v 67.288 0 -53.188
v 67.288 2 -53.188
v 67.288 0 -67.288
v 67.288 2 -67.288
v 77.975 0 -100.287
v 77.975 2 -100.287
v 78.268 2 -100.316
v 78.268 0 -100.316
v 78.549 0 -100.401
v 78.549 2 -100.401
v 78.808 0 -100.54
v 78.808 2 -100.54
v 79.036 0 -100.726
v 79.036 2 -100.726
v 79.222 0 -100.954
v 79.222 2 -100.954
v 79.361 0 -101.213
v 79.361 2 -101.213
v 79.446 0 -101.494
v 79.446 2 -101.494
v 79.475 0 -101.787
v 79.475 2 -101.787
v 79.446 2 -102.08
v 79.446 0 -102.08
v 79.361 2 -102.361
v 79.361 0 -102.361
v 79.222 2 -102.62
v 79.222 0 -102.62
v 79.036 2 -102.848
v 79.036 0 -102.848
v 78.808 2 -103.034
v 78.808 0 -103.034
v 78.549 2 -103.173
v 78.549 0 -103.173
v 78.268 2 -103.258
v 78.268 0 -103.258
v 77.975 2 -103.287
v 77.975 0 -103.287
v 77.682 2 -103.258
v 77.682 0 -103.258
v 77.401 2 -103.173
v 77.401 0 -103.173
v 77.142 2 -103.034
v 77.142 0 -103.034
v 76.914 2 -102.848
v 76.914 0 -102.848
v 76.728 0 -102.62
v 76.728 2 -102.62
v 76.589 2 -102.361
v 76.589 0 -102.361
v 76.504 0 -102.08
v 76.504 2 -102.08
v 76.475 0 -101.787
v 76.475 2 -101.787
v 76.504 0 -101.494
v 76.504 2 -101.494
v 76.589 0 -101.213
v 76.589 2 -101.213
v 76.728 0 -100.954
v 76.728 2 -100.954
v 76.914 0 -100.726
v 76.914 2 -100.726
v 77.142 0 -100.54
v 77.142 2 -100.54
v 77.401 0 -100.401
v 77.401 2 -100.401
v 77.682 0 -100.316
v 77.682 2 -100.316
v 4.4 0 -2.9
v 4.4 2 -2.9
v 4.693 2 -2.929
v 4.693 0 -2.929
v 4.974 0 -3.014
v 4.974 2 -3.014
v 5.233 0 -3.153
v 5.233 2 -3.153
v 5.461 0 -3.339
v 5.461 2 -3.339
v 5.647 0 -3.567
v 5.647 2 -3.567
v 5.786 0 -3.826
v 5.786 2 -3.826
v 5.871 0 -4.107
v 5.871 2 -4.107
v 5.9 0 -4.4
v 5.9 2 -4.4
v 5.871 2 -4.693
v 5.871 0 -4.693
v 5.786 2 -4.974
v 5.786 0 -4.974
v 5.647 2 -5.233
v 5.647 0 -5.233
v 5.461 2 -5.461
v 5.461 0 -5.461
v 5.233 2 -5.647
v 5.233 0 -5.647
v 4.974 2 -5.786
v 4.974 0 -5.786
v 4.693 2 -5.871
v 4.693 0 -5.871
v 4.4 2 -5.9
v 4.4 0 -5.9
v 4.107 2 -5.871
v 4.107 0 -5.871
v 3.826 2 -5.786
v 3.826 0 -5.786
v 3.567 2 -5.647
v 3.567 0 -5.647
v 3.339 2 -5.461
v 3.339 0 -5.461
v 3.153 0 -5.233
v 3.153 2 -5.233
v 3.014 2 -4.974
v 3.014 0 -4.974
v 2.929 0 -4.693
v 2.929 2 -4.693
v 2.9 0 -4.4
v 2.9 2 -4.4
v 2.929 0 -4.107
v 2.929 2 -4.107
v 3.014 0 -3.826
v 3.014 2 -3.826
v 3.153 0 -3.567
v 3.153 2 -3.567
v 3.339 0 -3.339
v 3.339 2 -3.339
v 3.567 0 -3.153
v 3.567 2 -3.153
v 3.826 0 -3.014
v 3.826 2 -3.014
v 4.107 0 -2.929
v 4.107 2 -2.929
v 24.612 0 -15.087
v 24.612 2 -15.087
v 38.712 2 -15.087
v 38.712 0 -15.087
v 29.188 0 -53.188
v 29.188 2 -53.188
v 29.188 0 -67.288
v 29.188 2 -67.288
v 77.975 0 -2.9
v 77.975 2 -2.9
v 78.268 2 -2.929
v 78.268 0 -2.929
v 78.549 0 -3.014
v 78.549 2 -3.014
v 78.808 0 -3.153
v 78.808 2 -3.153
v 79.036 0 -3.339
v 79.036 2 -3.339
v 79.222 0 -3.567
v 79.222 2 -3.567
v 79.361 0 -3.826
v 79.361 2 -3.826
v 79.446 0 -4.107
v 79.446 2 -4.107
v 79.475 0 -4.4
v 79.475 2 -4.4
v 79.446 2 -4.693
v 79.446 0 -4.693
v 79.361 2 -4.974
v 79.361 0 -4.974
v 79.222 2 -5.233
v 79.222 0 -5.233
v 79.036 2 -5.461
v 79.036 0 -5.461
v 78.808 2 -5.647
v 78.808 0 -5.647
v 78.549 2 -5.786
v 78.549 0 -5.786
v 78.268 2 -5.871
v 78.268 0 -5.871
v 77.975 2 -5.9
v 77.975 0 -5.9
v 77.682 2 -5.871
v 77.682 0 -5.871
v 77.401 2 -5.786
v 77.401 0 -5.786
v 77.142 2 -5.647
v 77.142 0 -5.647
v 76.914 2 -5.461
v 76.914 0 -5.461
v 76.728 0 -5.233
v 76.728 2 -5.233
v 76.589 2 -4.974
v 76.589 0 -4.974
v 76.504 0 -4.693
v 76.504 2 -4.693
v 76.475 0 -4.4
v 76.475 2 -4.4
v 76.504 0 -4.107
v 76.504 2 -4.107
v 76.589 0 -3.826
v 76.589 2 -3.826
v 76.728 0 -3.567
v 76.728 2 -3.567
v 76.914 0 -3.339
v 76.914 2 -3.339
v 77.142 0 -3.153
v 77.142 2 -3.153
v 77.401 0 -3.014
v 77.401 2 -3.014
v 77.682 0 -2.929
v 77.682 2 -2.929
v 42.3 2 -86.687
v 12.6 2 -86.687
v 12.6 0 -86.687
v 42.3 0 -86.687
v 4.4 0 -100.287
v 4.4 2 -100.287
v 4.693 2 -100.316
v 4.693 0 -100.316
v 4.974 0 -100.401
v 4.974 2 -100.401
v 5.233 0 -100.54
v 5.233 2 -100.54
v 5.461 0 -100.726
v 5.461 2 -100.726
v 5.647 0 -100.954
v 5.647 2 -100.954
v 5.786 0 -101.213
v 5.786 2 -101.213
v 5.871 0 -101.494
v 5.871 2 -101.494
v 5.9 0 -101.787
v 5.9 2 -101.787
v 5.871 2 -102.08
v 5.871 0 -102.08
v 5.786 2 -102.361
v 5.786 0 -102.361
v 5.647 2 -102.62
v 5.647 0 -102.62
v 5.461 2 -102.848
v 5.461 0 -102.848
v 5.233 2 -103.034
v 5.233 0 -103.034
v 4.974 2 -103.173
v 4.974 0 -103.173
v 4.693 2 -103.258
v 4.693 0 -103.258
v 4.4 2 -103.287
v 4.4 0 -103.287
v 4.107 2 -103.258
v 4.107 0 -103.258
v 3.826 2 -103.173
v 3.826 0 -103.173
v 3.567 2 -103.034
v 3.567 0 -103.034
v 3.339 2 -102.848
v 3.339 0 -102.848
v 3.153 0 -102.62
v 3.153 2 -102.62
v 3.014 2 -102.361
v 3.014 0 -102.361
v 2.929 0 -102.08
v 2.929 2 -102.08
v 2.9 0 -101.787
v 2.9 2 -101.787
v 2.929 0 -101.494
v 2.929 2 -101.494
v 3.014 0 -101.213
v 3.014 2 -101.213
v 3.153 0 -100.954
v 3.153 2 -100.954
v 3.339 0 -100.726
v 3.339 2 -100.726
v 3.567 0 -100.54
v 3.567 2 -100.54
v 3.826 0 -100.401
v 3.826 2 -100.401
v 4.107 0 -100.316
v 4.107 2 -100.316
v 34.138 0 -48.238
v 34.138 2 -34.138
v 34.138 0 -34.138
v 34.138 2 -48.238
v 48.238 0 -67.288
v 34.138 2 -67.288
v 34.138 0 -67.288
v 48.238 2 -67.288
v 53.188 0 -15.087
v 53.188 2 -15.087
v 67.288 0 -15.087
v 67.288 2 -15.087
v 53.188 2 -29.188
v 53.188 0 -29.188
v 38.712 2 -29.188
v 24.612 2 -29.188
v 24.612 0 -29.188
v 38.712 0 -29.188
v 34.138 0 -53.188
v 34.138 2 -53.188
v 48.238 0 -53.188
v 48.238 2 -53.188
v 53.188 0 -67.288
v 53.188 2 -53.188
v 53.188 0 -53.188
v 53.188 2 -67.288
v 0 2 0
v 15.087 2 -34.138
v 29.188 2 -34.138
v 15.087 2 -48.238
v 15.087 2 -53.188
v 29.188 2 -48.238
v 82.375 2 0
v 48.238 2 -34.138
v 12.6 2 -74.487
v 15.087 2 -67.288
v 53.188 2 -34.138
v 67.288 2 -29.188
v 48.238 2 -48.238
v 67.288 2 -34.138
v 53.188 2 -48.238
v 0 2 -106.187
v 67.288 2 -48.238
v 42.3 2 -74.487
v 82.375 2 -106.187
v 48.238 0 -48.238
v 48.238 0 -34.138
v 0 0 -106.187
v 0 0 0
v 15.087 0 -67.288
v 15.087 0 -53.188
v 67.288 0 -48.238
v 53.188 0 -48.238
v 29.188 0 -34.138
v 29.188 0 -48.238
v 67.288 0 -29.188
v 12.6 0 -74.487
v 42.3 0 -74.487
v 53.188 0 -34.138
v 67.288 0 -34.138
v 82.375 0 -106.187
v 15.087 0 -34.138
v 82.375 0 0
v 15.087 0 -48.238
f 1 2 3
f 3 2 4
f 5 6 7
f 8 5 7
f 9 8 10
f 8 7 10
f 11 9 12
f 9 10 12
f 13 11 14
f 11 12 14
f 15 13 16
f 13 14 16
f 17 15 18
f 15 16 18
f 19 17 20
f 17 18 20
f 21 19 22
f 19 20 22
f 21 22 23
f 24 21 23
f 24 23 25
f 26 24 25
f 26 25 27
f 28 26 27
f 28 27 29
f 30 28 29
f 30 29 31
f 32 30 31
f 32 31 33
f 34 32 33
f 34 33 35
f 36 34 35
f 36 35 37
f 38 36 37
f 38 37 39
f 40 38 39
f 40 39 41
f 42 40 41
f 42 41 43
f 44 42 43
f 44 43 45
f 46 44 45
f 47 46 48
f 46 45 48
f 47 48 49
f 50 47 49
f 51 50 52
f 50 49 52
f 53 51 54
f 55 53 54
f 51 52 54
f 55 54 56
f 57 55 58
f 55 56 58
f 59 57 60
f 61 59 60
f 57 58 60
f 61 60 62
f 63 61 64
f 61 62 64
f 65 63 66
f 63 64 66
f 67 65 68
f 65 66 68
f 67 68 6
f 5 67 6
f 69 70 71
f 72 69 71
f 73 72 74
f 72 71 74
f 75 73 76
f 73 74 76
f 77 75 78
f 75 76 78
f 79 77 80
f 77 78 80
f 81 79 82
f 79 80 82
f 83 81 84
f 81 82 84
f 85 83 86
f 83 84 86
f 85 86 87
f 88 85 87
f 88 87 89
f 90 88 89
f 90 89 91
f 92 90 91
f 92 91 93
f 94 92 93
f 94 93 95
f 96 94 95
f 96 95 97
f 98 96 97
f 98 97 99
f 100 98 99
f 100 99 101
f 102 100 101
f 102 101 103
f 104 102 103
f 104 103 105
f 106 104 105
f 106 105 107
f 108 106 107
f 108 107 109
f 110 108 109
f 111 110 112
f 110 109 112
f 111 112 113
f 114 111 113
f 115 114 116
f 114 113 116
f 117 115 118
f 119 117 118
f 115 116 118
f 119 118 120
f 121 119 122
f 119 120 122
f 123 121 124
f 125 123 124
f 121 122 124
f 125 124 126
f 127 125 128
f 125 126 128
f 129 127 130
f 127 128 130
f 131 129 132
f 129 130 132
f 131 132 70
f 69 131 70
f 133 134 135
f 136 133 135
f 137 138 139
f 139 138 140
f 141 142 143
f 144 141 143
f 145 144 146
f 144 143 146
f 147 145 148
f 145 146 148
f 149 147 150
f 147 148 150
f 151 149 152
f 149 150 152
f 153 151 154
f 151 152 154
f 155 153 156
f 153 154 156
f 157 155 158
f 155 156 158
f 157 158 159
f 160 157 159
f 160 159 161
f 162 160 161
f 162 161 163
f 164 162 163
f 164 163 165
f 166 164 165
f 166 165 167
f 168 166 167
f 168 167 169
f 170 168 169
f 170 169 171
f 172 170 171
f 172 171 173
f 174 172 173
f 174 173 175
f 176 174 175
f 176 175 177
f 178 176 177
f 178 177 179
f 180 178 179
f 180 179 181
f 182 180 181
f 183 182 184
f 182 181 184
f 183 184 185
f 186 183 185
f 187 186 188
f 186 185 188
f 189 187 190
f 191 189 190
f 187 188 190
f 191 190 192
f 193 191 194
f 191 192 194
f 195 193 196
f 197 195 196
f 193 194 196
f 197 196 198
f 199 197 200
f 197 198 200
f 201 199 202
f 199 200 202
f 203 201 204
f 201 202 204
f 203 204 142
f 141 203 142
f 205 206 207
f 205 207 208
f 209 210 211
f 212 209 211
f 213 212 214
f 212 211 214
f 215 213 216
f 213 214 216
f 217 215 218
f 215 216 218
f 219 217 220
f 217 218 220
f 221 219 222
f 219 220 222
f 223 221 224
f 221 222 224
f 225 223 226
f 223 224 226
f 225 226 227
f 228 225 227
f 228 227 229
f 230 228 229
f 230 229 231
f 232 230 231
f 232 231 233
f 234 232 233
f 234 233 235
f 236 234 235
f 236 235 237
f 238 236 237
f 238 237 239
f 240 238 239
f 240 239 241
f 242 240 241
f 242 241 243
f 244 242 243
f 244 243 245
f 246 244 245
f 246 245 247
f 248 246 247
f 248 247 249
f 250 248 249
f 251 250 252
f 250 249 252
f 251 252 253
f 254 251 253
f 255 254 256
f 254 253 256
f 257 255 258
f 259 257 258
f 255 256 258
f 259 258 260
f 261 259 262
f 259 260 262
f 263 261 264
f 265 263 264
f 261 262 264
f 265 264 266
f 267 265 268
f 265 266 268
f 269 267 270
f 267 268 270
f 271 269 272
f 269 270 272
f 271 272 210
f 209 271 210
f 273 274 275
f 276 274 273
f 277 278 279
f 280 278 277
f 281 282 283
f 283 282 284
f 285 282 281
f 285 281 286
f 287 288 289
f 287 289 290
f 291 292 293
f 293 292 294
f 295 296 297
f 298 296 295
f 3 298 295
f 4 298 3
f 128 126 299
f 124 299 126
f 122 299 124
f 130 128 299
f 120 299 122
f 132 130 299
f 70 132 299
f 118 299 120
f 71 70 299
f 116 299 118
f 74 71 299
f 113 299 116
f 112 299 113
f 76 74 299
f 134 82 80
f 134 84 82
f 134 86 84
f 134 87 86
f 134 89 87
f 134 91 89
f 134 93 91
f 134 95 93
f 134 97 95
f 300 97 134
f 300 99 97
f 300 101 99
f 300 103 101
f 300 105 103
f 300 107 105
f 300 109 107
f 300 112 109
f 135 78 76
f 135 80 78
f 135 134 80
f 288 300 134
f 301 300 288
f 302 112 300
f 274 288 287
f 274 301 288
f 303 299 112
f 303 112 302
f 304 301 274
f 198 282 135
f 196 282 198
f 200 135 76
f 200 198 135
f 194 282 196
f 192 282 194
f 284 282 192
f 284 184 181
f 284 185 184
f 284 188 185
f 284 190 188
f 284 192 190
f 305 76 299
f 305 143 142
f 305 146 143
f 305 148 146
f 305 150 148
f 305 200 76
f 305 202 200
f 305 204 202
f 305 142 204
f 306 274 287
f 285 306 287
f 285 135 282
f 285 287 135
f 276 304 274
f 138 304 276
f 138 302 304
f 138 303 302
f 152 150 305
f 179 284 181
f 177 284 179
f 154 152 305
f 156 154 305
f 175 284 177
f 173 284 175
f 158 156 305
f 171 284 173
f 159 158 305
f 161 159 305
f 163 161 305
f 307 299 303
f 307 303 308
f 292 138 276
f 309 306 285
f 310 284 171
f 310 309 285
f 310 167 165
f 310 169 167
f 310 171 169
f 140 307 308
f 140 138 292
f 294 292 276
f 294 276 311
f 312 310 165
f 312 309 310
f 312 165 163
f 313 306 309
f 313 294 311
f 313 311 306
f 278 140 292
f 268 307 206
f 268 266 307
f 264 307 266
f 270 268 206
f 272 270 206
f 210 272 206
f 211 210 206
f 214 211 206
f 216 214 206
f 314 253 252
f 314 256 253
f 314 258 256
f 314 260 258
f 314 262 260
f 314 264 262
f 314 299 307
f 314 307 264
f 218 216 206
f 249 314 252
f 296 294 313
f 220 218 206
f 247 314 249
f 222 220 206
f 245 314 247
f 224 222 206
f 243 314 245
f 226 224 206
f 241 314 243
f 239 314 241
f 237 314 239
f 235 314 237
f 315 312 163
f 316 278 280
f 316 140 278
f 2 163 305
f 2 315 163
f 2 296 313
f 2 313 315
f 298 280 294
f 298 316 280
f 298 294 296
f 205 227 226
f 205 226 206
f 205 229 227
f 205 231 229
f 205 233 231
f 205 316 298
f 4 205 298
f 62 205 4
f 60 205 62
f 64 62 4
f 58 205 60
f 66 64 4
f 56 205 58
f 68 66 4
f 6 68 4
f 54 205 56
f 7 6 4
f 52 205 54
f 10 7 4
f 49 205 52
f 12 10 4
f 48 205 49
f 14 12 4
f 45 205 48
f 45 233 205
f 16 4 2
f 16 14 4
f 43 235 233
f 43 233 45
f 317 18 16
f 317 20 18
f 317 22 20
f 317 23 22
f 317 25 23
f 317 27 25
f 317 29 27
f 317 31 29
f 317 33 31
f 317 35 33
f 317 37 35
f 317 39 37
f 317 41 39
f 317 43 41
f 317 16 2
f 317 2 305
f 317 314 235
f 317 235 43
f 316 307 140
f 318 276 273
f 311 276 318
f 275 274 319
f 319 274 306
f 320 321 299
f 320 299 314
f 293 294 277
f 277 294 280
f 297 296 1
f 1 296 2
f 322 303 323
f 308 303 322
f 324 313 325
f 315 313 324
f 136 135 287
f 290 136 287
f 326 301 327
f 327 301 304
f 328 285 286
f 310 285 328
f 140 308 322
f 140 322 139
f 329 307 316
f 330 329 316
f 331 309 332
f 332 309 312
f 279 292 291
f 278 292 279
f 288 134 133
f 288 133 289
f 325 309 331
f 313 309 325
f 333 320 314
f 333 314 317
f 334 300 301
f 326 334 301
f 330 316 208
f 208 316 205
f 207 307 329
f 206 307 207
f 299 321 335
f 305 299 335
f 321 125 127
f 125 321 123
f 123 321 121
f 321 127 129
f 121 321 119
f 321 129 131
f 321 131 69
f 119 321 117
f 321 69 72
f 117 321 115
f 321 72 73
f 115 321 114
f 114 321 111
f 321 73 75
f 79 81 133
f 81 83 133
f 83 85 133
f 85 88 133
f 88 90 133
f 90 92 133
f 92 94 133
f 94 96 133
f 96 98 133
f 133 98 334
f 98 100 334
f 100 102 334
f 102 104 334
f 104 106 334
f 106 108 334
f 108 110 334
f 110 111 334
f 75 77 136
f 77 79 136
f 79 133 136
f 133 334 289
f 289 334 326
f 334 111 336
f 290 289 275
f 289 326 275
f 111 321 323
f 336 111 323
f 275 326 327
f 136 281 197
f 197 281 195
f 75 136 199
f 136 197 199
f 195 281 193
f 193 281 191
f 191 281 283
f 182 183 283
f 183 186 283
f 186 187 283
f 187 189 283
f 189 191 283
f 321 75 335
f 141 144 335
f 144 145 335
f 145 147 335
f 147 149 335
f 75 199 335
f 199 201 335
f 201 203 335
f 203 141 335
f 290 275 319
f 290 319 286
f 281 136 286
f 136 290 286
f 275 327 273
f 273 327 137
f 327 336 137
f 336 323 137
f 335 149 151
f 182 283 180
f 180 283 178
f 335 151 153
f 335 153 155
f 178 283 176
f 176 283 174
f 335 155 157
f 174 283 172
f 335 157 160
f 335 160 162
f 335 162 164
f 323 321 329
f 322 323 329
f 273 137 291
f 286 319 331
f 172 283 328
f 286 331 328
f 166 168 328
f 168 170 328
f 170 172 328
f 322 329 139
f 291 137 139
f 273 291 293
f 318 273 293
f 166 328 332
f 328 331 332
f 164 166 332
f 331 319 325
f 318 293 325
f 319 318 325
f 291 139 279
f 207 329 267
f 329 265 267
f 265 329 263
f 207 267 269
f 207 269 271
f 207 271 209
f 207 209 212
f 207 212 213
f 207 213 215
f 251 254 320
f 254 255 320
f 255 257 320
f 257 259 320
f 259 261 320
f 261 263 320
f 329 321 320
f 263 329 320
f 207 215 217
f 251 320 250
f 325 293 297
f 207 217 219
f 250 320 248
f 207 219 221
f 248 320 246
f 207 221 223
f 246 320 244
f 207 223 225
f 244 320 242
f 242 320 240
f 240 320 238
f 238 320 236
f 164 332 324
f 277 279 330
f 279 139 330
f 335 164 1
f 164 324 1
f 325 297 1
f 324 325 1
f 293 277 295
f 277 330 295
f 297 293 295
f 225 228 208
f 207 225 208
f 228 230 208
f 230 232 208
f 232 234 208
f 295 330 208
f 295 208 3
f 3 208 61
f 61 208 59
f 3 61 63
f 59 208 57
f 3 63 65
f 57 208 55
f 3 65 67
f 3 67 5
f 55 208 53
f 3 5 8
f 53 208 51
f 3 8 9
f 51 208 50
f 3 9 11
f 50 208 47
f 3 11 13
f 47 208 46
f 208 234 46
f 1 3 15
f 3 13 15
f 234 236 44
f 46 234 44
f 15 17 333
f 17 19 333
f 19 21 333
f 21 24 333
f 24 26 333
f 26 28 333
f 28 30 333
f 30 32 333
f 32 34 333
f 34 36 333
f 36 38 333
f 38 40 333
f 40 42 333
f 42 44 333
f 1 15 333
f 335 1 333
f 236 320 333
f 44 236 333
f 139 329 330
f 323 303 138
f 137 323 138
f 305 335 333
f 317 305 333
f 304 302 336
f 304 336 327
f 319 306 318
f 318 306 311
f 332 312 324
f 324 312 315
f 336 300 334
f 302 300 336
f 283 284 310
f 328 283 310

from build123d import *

# Parameters (mm, degrees)
SKETCH1_W           = 82.375
SKETCH1_H           = 106.187
ACRYLIC_SHEET_DEPTH = 2
SKETCH2_R           = 1.5
SKETCH2_W           = 14.1
SKETCH2_H           = 14.1
SKETCH2_W_2         = 29.7
SKETCH2_H_2         = 12.2
ACRYLIC_CUT_DEPTH   = 135.407289959


with BuildPart() as part:
    # Sketch1 → Acrylic-Sheet (new body)
    with BuildSketch(Plane(origin=(0, 0, 0), x_dir=(1, 0, 0), z_dir=(0, 1, 0))):
        with Locations((41.1875, 53.0935)):
            Rectangle(SKETCH1_W, SKETCH1_H)
    extrude(amount=ACRYLIC_SHEET_DEPTH)

    # Sketch2 → Acrylic-Cut (cut, through all)
    with BuildSketch(Plane(origin=(0, 2, 0), x_dir=(1, 0, 0), z_dir=(0, 1, 0))):
        with Locations(Location((4.4, 101.787, 0), (0, 0, 270))):
            Circle(SKETCH2_R)
        with Locations(Location((77.975, 101.787, 0), (0, 0, 270))):
            Circle(SKETCH2_R)
        with Locations(Location((77.975, 4.4, 0), (0, 0, 270))):
            Circle(SKETCH2_R)
        with Locations(Location((4.4, 4.4, 0), (0, 0, 270))):
            Circle(SKETCH2_R)
        with Locations((22.1375, 60.2375)):
            Rectangle(SKETCH2_W, SKETCH2_H)
        with Locations((27.45, 80.587)):
            Rectangle(SKETCH2_W_2, SKETCH2_H_2)
        with Locations((41.1875, 60.2375)):
            Rectangle(SKETCH2_W, SKETCH2_H)
        with Locations((60.2375, 60.2375)):
            Rectangle(SKETCH2_W, SKETCH2_H)
        with Locations((22.1375, 41.1875)):
            Rectangle(SKETCH2_W, SKETCH2_H)
        with Locations((41.1875, 41.1875)):
            Rectangle(SKETCH2_W, SKETCH2_H)
        with Locations((60.2375, 41.1875)):
            Rectangle(SKETCH2_W, SKETCH2_H)
        with Locations((31.6625, 22.1375)):
            Rectangle(SKETCH2_W, SKETCH2_H)
        with Locations((60.2375, 22.1375)):
            Rectangle(SKETCH2_W, SKETCH2_H)
    extrude(amount=-ACRYLIC_CUT_DEPTH, mode=Mode.SUBTRACT)


solid = part.part
